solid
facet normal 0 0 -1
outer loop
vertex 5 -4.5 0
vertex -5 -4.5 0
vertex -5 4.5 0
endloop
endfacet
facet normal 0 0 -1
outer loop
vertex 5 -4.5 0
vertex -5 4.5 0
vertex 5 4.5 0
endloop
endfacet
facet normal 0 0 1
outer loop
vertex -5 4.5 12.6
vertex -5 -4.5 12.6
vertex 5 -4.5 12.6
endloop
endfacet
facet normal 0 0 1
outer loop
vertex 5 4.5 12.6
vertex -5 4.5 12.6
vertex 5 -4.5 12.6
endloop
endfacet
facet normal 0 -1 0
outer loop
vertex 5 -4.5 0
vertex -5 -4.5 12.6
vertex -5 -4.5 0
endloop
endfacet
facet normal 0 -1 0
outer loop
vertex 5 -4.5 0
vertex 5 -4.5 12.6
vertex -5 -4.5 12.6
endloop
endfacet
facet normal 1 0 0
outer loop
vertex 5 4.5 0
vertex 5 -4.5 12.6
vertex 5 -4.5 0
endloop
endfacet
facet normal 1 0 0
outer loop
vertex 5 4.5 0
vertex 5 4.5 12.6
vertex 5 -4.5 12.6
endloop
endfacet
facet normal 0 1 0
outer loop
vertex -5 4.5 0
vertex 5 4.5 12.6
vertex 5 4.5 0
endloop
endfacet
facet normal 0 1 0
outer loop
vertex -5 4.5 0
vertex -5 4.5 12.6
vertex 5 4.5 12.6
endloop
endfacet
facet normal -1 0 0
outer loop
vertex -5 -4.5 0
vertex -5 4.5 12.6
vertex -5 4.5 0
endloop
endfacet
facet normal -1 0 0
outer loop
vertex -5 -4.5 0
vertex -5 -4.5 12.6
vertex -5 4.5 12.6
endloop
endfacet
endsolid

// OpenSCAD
// datasheet: https://www.tme.eu/Document/adcdc895102d44b158b752608cb08ff1/DG300-5.0.pdf
CHASSIS_X_LENGTH = 10;
CHASSIS_Y_LENGTH = 9;
CHASSIS_Z_LENGTH = 12.6;

// Increase steps in render to have quality circles
$fs=0.01;


module Transformer() {
    
    linear_extrude(height = CHASSIS_Z_LENGTH, convexity = 10, twist = 0)
        translate([-CHASSIS_X_LENGTH/2, -CHASSIS_Y_LENGTH/2,0])
                square([CHASSIS_X_LENGTH,CHASSIS_Y_LENGTH]);
}

Transformer();
